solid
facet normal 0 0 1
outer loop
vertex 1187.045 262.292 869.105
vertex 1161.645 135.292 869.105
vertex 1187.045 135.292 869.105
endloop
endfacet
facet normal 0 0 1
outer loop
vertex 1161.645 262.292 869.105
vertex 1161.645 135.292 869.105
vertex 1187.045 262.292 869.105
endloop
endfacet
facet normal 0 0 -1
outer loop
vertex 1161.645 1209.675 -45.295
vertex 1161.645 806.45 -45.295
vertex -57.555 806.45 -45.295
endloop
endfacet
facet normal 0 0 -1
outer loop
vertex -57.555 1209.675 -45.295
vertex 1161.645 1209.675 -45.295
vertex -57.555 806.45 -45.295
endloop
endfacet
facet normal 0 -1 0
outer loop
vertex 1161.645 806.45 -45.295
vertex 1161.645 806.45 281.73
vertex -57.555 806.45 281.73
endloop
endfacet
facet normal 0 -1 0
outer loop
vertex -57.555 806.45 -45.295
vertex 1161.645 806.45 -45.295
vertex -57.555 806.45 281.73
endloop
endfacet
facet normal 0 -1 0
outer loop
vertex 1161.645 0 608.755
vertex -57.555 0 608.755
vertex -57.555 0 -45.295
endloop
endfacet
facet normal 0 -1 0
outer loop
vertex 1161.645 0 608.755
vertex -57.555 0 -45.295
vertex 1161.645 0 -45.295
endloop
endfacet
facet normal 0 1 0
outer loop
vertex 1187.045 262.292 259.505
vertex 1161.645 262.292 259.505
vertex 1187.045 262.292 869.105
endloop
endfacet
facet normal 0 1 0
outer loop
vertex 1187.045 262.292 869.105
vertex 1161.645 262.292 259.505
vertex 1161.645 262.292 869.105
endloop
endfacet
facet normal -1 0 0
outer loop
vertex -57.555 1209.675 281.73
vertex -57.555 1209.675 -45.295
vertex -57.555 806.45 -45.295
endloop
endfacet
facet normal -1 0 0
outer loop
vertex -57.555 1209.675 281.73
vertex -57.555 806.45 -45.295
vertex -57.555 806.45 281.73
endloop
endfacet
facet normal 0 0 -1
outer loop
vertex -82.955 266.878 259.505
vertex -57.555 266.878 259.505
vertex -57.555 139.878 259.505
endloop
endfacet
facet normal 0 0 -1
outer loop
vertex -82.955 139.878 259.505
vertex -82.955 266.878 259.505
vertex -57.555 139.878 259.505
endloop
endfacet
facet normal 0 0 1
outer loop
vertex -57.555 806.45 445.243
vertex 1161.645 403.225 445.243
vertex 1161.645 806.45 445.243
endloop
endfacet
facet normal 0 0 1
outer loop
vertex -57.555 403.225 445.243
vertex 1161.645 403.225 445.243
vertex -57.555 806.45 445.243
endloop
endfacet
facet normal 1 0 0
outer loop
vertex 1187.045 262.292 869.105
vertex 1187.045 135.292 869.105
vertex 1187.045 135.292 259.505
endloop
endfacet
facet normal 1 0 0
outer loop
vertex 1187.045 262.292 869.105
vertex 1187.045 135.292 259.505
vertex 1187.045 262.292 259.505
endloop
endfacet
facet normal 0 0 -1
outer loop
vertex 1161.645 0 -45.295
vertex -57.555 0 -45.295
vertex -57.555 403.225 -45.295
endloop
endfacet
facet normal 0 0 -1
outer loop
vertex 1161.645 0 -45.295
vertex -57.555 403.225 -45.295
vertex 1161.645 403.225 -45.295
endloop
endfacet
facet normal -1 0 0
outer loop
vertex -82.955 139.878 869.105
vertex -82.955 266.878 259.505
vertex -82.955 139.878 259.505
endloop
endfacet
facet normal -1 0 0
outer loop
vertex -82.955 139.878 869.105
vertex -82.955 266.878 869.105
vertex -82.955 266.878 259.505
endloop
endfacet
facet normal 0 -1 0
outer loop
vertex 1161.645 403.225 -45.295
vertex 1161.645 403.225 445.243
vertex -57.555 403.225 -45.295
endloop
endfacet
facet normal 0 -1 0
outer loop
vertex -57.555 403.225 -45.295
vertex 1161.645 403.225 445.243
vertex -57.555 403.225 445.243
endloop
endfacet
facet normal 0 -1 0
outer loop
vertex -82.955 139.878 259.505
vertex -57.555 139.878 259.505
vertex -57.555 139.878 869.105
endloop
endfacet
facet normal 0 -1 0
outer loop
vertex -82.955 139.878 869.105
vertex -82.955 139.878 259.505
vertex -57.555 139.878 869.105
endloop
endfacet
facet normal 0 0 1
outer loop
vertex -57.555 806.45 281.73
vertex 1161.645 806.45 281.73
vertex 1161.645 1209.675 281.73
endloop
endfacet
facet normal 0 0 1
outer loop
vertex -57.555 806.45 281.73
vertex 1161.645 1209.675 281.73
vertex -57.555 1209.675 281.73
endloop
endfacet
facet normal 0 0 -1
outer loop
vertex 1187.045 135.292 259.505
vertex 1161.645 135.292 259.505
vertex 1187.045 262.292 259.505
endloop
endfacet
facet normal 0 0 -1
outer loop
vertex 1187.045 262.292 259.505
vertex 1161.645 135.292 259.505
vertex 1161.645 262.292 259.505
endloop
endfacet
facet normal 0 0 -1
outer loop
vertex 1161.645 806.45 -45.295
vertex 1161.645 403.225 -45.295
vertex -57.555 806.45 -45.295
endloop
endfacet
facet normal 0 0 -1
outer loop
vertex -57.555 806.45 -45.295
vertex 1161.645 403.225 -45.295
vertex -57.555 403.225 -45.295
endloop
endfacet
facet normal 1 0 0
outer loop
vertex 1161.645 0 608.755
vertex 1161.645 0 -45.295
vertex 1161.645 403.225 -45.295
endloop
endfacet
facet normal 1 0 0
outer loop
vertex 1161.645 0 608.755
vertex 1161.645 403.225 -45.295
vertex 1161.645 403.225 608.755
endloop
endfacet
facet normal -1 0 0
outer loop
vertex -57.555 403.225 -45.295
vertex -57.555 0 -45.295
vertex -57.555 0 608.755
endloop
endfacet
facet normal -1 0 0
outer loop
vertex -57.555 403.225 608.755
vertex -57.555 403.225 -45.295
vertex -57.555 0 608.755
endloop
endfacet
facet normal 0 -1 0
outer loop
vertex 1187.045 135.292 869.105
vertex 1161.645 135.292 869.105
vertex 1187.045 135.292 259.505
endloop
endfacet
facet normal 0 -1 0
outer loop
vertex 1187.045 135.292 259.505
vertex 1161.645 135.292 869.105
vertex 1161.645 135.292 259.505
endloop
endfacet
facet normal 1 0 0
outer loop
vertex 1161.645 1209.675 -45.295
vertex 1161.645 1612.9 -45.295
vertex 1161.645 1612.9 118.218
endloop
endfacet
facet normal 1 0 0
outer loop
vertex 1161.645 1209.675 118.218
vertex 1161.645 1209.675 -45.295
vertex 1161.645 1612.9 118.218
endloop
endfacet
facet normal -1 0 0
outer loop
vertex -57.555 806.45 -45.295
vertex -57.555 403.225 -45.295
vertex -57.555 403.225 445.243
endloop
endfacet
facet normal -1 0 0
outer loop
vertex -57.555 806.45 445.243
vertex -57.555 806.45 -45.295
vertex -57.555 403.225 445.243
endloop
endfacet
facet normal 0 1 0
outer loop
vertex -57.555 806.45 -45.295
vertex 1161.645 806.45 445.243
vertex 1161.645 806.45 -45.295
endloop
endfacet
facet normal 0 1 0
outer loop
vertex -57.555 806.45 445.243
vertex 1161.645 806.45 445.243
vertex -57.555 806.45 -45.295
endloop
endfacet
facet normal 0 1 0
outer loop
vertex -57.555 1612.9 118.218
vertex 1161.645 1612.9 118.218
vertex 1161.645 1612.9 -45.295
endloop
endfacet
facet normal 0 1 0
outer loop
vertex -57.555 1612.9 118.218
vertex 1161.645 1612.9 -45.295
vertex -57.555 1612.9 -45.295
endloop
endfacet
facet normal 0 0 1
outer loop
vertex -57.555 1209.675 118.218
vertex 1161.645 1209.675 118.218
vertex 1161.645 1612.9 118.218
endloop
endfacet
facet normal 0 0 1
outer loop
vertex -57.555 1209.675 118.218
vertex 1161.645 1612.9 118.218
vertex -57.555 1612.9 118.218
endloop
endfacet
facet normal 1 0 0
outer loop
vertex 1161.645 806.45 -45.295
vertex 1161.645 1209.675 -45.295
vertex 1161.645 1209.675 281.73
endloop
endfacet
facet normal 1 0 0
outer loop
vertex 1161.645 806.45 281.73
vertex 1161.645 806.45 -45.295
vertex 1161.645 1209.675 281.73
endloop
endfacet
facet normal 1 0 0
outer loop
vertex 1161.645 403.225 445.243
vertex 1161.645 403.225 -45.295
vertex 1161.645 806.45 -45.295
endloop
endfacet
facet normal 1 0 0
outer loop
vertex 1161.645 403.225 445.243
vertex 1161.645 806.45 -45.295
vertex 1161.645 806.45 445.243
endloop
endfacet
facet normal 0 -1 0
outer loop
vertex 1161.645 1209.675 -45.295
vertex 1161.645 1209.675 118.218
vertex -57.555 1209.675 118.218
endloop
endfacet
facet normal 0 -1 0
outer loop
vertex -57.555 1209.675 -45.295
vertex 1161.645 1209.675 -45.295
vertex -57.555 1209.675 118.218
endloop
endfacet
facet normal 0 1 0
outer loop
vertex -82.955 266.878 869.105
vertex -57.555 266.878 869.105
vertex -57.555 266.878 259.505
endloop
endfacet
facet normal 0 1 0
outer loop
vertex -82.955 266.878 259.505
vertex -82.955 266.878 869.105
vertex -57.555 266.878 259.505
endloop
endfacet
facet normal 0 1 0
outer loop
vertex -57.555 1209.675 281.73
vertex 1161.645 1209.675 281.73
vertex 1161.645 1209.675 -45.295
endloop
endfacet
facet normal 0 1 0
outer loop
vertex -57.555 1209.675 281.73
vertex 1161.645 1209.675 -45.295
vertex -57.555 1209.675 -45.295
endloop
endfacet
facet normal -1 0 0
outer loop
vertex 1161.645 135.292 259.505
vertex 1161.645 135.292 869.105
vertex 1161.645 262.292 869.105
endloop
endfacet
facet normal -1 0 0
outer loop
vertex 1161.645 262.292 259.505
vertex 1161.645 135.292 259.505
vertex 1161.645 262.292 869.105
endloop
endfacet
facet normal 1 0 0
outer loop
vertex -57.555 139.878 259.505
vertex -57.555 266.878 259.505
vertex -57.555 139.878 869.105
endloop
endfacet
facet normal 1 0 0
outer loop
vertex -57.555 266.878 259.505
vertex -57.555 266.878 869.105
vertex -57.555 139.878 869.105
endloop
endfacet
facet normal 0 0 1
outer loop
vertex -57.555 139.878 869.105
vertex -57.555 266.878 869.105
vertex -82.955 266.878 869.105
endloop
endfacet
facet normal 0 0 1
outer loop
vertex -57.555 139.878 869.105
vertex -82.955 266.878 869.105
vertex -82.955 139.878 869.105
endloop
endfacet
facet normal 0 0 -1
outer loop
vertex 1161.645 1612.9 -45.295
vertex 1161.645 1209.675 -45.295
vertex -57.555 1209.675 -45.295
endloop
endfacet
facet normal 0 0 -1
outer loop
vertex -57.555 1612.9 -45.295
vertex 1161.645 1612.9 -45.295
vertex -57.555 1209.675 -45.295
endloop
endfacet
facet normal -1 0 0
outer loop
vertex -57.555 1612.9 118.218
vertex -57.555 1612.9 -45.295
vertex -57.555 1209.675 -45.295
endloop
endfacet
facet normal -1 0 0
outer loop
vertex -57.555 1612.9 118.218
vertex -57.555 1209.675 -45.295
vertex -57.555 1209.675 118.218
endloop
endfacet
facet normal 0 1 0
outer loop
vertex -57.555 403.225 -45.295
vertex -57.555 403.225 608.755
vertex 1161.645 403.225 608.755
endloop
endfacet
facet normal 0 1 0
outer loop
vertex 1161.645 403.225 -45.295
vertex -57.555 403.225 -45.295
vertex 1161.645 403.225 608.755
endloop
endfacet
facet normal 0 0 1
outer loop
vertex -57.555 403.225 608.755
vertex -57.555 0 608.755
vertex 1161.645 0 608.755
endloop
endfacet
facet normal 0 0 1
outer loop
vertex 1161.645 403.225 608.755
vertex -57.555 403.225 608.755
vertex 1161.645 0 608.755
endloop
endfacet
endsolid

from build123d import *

# Parameters (mm, degrees)
F0_W      = 1219.2
F0_H      = 654.05
F1_DEPTH  = 403.225
F2_W      = 1219.2
F2_H      = 490.5375
F3_DEPTH  = 403.225
F4_W      = 1219.2
F4_H      = 327.025
F5_DEPTH  = 403.225
F6_W      = 1219.2
F6_H      = 163.5125
F7_DEPTH  = 403.225
F8_W      = 127
F8_H      = 260.35
F8_H_2    = 349.25
F9_DEPTH  = 25.4
F10_W     = 127
F10_H     = 349.25
F10_H_2   = 260.35
F11_DEPTH = 25.4


with BuildPart() as f1:
    # F0 (on Front) → F1 (new body)
    with BuildSketch(Plane.XZ):
        with Locations((552.0450583756, 281.7302793205)):
            Rectangle(F0_W, F0_H)
    extrude(amount=-F1_DEPTH)


with BuildPart() as f3:
    # F2 (on face) → F3 (new body)
    with BuildSketch(Plane(origin=(0, 403.225, 0), x_dir=(-1, 0, 0), z_dir=(0, 1, 0))):
        with Locations((-552.0450583756, 199.9740293205)):
            Rectangle(F2_W, F2_H)
    extrude(amount=F3_DEPTH)


with BuildPart() as f5:
    # F4 (on face) → F5 (new body)
    with BuildSketch(Plane(origin=(0, 806.45, 0), x_dir=(-1, 0, 0), z_dir=(0, 1, 0))):
        with Locations((-552.0450583756, 118.2177793205)):
            Rectangle(F4_W, F4_H)
    extrude(amount=F5_DEPTH)


with BuildPart() as f7:
    # F6 (on face) → F7 (new body)
    with BuildSketch(Plane(origin=(0, 1209.675, 0), x_dir=(-1, 0, 0), z_dir=(0, 1, 0))):
        with Locations((-552.0450583756, 36.4615293205)):
            Rectangle(F6_W, F6_H)
    extrude(amount=F7_DEPTH)


with BuildPart() as f9:
    # F8 (on face) → F9 (new body)
    with BuildSketch(Plane.YZ.offset(1161.6450583756)):
        with Locations((198.7918540835, 738.9302793205)):
            Rectangle(F8_W, F8_H)
        with Locations((198.7918540835, 434.1302793205)):
            Rectangle(F8_W, F8_H_2)
    extrude(amount=F9_DEPTH)


with BuildPart() as f11:
    # F10 (on face) → F11 (new body)
    with BuildSketch(Plane(origin=(-57.5549416244, 0, 0), x_dir=(0, -1, 0), z_dir=(-1, 0, 0))):
        with Locations((-203.377969563, 434.1302793205)):
            Rectangle(F10_W, F10_H)
        with Locations((-203.377969563, 738.9302793205)):
            Rectangle(F10_W, F10_H_2)
    extrude(amount=F11_DEPTH)


solid = Compound([f1.part, f3.part, f5.part, f7.part, f9.part, f11.part])
